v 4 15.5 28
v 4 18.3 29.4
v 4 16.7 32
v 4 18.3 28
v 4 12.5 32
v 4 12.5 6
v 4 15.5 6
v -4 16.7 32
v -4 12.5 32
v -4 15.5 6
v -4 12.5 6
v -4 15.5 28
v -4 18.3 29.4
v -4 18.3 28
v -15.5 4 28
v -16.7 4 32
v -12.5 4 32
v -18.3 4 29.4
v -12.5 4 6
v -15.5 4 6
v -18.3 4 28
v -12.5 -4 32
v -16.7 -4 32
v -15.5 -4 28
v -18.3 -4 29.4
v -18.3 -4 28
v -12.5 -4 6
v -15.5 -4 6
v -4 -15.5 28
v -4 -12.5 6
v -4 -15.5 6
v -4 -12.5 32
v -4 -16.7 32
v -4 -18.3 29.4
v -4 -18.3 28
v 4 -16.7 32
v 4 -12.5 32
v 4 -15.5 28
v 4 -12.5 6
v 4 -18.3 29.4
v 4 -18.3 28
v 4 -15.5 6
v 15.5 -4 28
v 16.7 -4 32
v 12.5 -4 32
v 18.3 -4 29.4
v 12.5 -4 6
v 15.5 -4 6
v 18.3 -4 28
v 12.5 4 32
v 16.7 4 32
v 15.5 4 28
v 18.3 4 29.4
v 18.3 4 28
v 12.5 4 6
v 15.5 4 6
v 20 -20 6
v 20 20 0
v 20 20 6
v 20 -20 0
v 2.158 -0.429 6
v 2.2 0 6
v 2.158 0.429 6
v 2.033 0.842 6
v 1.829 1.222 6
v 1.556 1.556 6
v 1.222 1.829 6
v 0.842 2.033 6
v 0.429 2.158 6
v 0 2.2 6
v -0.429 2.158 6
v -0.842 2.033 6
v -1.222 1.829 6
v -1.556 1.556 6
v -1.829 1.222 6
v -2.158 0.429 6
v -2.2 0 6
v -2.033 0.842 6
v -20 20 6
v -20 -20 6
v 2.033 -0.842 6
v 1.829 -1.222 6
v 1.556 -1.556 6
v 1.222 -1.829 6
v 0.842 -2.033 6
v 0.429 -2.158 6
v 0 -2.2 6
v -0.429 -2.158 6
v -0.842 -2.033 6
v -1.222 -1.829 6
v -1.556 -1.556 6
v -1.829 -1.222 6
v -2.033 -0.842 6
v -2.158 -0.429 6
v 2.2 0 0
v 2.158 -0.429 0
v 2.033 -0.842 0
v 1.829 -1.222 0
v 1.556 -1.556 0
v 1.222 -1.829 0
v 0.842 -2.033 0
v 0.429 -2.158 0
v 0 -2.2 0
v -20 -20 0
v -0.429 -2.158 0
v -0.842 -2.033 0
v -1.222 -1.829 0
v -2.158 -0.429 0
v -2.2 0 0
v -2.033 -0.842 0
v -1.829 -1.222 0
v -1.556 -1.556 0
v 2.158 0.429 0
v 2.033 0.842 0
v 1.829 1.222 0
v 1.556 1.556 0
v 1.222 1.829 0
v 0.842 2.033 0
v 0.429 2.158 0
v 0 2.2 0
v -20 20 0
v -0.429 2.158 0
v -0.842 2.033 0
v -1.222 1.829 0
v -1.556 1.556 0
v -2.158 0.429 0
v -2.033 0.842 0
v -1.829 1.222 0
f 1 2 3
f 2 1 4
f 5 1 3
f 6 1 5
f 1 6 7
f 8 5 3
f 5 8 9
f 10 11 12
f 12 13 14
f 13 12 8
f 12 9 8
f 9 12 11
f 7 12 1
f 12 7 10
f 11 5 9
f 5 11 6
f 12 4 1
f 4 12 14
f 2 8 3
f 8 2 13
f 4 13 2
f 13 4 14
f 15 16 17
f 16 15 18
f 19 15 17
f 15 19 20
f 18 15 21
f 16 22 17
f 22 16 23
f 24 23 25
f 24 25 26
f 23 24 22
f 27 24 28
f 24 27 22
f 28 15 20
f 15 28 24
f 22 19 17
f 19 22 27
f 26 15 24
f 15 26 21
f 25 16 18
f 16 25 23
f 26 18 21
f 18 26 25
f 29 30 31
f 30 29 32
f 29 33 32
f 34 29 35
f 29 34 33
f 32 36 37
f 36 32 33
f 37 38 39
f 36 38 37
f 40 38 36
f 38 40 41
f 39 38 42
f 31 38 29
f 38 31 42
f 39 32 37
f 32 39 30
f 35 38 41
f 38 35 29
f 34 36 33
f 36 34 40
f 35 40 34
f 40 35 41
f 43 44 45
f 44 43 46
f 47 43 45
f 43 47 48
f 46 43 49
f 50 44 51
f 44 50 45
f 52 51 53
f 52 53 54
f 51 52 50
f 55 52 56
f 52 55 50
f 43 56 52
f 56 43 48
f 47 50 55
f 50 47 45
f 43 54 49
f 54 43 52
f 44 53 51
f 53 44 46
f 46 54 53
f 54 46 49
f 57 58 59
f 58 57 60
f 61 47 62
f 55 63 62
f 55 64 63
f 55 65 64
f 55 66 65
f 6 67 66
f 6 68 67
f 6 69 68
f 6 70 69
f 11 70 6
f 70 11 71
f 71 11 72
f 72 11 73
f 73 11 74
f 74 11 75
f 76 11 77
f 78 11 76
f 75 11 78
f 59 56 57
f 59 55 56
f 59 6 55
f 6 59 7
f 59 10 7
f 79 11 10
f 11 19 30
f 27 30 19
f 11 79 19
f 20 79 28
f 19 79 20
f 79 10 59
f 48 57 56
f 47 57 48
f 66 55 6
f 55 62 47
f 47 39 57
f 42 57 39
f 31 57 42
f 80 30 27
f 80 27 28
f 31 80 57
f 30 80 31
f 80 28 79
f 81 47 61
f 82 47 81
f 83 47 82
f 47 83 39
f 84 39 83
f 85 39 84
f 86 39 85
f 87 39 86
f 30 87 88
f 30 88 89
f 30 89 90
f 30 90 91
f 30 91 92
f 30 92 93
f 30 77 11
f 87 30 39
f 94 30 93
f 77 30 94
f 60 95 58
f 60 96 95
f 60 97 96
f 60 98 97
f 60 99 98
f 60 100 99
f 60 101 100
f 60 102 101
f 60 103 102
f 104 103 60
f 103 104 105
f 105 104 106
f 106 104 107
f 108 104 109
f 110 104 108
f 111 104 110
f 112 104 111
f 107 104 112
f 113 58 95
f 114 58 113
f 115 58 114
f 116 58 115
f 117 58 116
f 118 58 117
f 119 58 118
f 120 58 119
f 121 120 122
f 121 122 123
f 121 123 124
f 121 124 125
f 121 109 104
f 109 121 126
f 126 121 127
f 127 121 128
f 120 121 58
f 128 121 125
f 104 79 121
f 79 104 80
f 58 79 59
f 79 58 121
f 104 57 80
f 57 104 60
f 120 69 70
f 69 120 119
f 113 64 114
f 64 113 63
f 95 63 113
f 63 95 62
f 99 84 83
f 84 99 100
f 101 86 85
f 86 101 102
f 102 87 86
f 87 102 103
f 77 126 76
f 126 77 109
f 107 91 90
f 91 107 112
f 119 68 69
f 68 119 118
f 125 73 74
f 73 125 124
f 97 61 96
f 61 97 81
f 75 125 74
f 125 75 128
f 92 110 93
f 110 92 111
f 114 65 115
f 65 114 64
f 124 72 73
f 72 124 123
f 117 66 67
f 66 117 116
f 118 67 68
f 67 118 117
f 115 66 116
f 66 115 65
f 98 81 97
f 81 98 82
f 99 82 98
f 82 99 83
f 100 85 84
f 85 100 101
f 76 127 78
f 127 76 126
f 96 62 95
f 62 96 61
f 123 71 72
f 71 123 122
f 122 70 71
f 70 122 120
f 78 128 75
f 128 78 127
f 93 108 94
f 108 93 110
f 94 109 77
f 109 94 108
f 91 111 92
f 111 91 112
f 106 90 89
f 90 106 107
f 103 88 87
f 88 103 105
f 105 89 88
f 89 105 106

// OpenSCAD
$fn = 32;

// ----------------------------------------------------------------------
// Snap-fit latch: 4 arms, 26 mm tall, 3 mm undercut hooks
// ----------------------------------------------------------------------

// --- parameters (mm) ---
base_d = 40;              // base plate depth
base_h = 6;               // base plate thickness
span = 28;                // distance between opposite arms
arm_t = 3;                // arm thickness
arm_d = 8;                // arm width
height = 26;              // free arm length
head_len = 3;             // hook reach
head_h = 4;               // hook height
lead = 1.4;               // lead-in ramp thickness
bore_d = 4.4;             // base fixing bore
top_z = 32;               // height of the arm tips above the base

arms = 4;

difference() {
  union() {
    /* base plate, centred on the arm ring */
    translate([-20, -20, 0]) cube([base_d, base_d, base_h]);
    for (a = [0 : 360 / arms : 359]) rotate([0, 0, a]) {
    /* arm, sunk 0.5 mm into the base */
    translate([-arm_d / 2, span / 2 - arm_t / 2, base_h - 0.5]) cube([arm_d, arm_t, height + 0.5]);
    /* hook: a convex hull of a tall inner block and a thin outer lip
       gives a flat undercut below and a lead-in ramp on top */
    hull() {
      translate([-arm_d / 2, span / 2 + arm_t / 2 - 0.6, top_z - head_h]) cube([arm_d, lead + 0.4, head_h]);
      translate([-arm_d / 2, span / 2 + arm_t / 2 - 0.2, top_z - head_h]) cube([arm_d, head_len, lead]);
    }
    }
  }
  translate([0, 0, -2.5]) cylinder(h = base_h + 5, d = bore_d);
}
